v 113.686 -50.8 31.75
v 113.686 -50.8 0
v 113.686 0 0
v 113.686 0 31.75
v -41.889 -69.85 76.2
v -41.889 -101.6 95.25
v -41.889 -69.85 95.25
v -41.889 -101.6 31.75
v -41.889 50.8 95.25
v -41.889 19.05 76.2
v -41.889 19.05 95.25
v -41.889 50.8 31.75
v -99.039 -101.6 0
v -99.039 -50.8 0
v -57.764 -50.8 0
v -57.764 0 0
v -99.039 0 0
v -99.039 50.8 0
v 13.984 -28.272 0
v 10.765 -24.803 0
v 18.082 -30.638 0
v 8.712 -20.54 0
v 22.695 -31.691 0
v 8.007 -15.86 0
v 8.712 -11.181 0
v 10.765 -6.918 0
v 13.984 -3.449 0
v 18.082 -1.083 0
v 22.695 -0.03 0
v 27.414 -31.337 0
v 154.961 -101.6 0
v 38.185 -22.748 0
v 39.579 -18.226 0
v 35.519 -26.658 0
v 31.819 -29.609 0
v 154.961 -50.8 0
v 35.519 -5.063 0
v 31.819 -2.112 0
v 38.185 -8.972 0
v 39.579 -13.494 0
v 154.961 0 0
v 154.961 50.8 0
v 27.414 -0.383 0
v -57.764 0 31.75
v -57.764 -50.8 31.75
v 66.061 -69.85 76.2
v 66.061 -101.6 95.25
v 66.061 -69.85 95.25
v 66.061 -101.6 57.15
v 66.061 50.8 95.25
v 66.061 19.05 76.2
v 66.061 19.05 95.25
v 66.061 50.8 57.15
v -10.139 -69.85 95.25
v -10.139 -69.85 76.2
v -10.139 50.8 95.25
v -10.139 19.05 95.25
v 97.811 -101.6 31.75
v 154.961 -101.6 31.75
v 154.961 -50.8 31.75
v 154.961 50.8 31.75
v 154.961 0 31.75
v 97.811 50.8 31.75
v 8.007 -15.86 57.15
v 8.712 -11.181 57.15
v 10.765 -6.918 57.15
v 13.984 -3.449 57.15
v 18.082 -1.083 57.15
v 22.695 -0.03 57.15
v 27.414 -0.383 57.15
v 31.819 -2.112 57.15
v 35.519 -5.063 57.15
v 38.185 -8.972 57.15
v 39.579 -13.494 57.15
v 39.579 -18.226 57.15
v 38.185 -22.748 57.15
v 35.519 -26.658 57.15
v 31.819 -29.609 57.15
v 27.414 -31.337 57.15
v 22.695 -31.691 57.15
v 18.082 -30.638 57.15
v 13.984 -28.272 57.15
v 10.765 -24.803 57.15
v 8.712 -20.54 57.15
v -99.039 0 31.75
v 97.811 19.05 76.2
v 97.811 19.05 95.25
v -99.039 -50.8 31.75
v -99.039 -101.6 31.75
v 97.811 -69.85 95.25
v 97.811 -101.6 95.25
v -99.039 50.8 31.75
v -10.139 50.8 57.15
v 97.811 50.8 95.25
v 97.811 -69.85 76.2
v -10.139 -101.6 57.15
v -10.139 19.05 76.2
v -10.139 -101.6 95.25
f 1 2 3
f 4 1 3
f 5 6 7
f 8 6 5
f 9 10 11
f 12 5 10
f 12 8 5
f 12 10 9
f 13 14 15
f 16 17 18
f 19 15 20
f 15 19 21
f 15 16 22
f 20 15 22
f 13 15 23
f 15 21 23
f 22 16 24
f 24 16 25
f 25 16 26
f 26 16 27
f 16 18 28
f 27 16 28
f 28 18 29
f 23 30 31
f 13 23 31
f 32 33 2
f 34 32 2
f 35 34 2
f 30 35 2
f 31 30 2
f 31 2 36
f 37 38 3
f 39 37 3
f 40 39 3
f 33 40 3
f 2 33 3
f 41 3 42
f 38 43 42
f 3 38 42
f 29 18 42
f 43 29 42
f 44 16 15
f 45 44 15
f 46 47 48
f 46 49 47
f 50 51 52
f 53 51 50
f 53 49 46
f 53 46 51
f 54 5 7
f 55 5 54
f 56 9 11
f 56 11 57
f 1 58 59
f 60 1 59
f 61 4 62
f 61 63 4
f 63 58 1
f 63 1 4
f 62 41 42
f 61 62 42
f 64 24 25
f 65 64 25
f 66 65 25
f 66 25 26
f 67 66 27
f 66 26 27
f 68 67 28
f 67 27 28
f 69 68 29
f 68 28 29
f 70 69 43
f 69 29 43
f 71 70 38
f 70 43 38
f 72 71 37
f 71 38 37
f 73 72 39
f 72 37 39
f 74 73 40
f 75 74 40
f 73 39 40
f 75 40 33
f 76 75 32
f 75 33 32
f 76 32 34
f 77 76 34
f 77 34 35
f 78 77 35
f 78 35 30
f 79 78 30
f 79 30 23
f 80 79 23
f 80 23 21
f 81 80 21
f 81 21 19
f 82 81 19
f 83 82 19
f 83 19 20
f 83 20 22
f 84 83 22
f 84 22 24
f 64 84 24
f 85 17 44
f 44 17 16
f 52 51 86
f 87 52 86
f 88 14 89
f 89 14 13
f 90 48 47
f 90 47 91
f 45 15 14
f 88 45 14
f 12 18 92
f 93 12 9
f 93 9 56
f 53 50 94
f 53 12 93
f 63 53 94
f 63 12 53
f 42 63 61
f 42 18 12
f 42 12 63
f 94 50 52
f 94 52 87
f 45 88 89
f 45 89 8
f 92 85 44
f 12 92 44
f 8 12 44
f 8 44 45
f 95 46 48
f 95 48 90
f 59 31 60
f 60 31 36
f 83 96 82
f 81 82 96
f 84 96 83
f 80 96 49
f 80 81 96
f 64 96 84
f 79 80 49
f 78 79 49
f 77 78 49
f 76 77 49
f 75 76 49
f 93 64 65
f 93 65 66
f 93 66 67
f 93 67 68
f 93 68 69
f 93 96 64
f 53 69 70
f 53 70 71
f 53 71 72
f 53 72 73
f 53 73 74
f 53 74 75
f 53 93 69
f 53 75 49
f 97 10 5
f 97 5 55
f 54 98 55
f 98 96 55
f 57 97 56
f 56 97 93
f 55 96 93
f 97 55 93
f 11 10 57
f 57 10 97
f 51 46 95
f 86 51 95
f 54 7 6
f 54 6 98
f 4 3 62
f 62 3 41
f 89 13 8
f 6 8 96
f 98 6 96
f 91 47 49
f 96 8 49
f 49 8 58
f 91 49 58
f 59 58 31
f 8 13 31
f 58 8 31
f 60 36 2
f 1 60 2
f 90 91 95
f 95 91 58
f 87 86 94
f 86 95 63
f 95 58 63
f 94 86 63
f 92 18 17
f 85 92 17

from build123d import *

# Parameters (mm, degrees)
F1_DEPTH  = 31.75
F2_W      = 139.7
F2_H      = 152.4
F3_DEPTH  = 25.4
F5_D      = 31.75
F6_W      = 31.75
F6_H      = 31.75
F6_H_2    = 88.9
F7_DEPTH  = 19.05
F8_W      = 31.75
F8_H      = 31.75
F9_DEPTH  = 19.05
F10_W     = 31.75
F10_H     = 31.75
F11_DEPTH = 19.05


with BuildPart() as f1:
    # F0 (on Top) → F1 (new body)
    with BuildSketch(Plane.XY):
        Polygon((154.9607325792, 50.8), (-99.0392674208, 50.8), (-99.0392674208, 0), (-57.7642674208, 0), (-57.7642674208, -50.8), (-99.0392674208, -50.8), (-99.0392674208, -101.6), (154.9607325792, -101.6), (154.9607325792, -50.8), (113.6857325792, -50.8), (113.6857325792, 0), (154.9607325792, 0), align=None)
    extrude(amount=F1_DEPTH)

    # F2 (on face) → F3 (join)
    with BuildSketch(Plane.XY.offset(31.75)):
        with Locations((27.9607325792, -25.4)):
            Rectangle(F2_W, F2_H)
    extrude(amount=F3_DEPTH)

    # F5 (through all)
    with Locations(Plane.XY.offset(57.15)):
        with Locations((23.8818004727, -15.8603843302)):
            Hole(F5_D / 2)

    # F6 (on face) → F7 (join)
    with BuildSketch(Plane.XY.offset(57.15)):
        with Locations((-26.0142674208, -85.725)):
            Rectangle(F6_W, F6_H)
        with Locations((-26.0142674208, 34.925)):
            Rectangle(F6_W, F6_H)
        with Locations((81.9357325792, 34.925)):
            Rectangle(F6_W, F6_H)
        with Locations((81.9357325792, -85.725)):
            Rectangle(F6_W, F6_H)
        with Locations((-26.0142674208, -25.4)):
            Rectangle(F6_W, F6_H_2)
        with Locations((81.9357325792, -25.4)):
            Rectangle(F6_W, F6_H_2)
    extrude(amount=F7_DEPTH)

    # F8 (on face) → F9 (join)
    with BuildSketch(Plane.XY.offset(76.2)):
        with Locations((-26.0142674208, -85.725)):
            Rectangle(F8_W, F8_H)
        with Locations((-26.0142674208, 34.925)):
            Rectangle(F8_W, F8_H)
    extrude(amount=F9_DEPTH)

    # F10 (on face) → F11 (join)
    with BuildSketch(Plane.XY.offset(76.2)):
        with Locations((81.9357325792, -85.725)):
            Rectangle(F10_W, F10_H)
        with Locations((81.9357325792, 34.925)):
            Rectangle(F10_W, F10_H)
    extrude(amount=F11_DEPTH)


solid = f1.part
